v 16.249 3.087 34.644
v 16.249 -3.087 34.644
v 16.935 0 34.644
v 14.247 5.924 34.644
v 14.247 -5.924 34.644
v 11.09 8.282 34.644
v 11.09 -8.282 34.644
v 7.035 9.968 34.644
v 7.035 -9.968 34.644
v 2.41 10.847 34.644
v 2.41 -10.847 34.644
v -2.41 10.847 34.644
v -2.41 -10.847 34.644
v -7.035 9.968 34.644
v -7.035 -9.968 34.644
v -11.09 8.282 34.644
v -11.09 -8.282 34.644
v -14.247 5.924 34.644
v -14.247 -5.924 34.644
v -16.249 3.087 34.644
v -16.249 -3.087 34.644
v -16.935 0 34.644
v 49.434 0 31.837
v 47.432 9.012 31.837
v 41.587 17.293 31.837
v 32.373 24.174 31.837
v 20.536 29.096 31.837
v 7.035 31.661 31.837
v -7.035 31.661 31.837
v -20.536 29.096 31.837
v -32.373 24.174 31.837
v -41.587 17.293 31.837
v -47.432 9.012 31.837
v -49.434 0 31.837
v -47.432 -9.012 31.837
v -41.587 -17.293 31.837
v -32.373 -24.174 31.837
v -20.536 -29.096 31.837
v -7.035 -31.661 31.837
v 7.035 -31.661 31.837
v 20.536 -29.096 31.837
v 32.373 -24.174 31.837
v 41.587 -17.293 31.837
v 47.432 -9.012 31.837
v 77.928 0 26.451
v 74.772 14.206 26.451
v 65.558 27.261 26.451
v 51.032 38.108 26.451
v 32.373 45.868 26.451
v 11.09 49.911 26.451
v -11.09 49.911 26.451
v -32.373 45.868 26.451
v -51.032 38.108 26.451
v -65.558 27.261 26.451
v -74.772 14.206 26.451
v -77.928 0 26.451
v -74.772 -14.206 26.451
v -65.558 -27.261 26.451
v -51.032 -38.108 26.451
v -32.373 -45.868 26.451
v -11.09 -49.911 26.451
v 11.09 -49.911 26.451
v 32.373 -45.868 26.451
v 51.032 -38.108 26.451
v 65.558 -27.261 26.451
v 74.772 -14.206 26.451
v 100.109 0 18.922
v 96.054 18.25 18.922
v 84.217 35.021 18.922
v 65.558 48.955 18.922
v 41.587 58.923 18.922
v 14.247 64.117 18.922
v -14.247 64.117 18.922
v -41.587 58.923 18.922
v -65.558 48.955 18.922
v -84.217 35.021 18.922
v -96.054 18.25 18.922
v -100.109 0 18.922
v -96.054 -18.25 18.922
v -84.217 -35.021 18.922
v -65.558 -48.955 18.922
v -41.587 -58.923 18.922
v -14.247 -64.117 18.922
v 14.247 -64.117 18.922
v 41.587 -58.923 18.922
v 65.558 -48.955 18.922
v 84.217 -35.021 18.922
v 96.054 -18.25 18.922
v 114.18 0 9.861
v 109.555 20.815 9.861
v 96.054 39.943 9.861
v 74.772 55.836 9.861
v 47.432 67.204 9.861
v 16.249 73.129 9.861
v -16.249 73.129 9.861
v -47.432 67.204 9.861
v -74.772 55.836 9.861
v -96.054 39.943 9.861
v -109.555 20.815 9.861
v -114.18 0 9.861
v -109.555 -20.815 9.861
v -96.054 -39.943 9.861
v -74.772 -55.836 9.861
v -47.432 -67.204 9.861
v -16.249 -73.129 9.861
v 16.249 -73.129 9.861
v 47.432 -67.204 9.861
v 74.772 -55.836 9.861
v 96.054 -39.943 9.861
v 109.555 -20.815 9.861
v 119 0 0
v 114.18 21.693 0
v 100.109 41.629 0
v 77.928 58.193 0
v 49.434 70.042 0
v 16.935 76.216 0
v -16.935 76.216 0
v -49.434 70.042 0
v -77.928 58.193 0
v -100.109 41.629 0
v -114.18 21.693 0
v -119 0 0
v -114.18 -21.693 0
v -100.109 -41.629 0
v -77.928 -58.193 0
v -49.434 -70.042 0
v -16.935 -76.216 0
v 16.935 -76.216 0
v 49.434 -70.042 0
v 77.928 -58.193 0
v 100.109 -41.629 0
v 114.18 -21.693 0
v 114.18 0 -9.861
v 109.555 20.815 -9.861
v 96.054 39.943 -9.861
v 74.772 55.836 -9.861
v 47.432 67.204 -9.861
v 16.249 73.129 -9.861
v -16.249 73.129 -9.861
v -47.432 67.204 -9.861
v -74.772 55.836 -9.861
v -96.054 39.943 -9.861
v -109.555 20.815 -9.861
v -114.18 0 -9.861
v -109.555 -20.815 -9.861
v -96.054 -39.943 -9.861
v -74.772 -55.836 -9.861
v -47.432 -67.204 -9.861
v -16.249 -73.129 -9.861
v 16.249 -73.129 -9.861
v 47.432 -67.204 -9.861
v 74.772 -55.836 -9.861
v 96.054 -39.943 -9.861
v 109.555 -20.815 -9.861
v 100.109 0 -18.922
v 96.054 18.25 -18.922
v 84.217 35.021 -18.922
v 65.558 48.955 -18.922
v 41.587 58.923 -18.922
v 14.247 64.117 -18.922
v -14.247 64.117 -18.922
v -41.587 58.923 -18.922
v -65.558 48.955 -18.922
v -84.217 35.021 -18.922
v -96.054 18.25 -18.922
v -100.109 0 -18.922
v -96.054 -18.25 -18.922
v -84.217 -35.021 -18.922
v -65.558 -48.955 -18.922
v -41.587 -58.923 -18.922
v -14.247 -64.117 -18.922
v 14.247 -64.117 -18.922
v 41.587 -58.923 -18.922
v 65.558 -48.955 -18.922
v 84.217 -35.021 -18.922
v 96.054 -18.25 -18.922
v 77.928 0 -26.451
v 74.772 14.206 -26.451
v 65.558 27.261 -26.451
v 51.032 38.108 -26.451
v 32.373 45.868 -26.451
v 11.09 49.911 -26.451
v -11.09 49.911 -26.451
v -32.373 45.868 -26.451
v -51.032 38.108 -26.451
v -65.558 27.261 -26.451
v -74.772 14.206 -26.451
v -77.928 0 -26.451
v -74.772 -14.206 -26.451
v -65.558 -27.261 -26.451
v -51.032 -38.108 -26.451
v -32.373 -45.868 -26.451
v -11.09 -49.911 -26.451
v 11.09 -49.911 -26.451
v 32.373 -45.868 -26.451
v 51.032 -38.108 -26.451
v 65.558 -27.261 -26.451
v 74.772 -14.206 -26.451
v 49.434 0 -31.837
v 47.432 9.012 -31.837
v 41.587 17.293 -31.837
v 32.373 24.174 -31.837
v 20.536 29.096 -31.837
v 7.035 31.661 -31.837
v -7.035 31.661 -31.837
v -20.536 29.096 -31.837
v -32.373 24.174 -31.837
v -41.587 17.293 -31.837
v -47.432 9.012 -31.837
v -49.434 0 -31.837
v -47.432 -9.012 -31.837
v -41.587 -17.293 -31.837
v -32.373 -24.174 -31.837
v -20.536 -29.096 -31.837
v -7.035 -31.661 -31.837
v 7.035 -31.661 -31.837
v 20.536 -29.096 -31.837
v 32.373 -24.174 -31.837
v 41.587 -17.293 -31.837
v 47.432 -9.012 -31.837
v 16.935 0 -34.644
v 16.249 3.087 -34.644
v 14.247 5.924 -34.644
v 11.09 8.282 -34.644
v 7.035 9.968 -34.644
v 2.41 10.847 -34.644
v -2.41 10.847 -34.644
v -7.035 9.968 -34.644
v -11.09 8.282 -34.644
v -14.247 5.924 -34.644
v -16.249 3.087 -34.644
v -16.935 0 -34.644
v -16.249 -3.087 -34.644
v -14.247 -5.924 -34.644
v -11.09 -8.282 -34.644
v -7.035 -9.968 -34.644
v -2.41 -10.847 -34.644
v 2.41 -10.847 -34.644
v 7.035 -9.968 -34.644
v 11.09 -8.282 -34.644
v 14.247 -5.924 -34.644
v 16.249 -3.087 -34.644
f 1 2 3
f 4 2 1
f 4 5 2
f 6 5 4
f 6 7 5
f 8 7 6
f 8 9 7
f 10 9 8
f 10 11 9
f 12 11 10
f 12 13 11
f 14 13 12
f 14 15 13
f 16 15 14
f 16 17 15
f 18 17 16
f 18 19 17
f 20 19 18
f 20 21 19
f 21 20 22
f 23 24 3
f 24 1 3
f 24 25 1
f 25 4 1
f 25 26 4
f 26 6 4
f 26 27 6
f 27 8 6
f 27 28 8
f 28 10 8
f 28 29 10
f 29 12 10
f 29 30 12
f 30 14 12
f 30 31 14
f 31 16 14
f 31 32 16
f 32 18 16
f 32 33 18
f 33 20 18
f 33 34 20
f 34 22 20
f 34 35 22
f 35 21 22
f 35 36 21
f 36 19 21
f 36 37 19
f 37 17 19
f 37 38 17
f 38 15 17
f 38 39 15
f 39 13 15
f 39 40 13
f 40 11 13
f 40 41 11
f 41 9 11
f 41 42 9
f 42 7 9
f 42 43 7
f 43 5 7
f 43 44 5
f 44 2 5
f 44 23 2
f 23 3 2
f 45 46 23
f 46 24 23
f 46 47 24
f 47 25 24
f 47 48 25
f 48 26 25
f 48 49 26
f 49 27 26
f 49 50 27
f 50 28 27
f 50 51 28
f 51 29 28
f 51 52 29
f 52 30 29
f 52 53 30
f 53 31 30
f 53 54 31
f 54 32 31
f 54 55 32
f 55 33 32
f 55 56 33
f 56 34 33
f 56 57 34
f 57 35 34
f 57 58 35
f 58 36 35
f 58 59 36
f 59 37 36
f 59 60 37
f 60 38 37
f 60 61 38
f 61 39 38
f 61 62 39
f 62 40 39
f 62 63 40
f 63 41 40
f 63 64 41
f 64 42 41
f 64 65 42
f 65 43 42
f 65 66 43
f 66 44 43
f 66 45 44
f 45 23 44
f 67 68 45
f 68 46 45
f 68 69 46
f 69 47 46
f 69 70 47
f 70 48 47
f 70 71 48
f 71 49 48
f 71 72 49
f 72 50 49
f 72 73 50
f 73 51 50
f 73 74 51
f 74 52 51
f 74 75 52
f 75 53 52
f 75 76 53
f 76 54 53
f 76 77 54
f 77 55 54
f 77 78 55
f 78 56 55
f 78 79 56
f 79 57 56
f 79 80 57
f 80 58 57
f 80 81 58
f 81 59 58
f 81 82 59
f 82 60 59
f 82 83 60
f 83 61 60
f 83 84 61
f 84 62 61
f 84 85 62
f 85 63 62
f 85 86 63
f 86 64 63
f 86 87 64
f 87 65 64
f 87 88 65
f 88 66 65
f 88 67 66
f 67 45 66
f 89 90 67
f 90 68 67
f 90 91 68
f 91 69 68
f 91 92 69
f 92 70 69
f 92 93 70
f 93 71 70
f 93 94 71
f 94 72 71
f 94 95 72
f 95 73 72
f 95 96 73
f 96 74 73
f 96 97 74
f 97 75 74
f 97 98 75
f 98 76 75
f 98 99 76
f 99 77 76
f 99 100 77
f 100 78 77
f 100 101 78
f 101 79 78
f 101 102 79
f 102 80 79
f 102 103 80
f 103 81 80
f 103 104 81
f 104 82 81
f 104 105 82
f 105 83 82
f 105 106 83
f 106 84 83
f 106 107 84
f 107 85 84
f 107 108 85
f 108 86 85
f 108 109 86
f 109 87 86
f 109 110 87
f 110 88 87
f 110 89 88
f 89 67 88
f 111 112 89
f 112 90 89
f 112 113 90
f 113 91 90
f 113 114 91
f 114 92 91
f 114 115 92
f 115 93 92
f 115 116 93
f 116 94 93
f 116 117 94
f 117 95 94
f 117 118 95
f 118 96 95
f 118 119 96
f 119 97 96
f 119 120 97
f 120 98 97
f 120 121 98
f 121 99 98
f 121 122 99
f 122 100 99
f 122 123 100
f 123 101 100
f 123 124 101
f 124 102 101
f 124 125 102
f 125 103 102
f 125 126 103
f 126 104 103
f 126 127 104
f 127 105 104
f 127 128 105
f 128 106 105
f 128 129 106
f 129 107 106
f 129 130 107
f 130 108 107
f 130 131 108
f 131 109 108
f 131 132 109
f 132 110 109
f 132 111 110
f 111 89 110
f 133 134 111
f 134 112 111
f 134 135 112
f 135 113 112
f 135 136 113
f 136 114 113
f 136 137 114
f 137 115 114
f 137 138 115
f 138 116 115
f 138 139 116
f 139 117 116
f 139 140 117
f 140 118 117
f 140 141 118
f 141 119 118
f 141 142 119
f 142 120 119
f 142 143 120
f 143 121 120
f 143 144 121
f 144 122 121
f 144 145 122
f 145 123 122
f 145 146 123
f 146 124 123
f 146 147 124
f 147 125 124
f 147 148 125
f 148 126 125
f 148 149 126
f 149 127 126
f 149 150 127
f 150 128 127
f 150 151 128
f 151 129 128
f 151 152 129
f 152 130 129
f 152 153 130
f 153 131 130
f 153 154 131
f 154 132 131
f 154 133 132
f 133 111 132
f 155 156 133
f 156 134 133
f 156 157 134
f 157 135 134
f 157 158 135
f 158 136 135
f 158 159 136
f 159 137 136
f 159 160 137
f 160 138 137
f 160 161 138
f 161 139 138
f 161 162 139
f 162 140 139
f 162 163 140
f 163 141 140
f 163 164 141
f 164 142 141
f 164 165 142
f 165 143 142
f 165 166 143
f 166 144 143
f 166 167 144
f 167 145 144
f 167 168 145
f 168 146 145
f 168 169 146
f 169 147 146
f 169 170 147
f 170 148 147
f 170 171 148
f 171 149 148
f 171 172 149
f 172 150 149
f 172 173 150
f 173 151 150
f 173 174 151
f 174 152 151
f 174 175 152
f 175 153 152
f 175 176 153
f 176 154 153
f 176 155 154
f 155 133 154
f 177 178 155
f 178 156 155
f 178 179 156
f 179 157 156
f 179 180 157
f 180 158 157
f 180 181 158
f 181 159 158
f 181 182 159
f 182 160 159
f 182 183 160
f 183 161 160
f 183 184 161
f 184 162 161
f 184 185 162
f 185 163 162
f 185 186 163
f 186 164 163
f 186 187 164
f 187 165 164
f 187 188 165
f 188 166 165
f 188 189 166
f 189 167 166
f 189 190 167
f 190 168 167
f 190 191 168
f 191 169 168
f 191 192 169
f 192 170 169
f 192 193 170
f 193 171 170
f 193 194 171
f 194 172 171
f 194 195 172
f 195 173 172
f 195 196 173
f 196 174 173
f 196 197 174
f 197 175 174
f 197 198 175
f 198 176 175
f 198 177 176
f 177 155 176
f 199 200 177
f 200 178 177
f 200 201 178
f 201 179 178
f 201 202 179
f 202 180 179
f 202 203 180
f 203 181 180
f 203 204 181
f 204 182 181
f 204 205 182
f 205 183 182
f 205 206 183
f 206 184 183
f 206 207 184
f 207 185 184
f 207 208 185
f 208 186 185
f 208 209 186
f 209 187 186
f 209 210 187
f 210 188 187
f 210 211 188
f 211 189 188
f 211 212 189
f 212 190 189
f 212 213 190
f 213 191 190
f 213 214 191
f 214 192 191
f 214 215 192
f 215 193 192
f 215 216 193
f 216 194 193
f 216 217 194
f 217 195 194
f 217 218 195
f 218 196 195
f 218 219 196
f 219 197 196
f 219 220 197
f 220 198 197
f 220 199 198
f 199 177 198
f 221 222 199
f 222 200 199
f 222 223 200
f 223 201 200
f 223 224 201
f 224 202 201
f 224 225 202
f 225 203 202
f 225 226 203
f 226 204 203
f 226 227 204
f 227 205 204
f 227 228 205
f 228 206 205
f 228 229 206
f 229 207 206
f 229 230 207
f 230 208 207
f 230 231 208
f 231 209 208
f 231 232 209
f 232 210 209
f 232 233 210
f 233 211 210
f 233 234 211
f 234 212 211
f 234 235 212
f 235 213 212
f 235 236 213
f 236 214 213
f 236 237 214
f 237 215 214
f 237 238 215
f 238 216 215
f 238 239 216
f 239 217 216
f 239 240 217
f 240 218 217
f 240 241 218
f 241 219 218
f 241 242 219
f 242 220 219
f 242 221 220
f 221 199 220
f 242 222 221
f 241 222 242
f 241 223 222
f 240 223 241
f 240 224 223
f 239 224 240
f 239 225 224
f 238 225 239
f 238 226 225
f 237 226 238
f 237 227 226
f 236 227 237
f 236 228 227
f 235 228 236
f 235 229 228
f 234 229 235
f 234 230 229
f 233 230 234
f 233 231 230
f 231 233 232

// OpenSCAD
// Generated by SolidPython 1.0.1 on 2020-07-29 00:46:53


scale(v = [17, 11, 5]) {
	sphere(r = 7);
}
/***********************************************
*********      SolidPython code:      **********
************************************************
 
# import packages: SolidPython
from solid import *
from solid.utils import *
from itertools import chain, combinations, permutations


class Resize:

    def __init__(self, scad_file):
        self.scad_file = scad_file
        #self.scad_file = import_scad(scad_file)
        # cone/cylinder param:
        self.r1 = 0
        self.r2 = 0
        self.h = 0
        # rectangular prism param:
        self.w = 0
        self.l = 0
        # ellipse param:
        self.r = 0

    # import OpenScad code (file name corresponds to shape)


    # classify shape + parameters
    def assign(self, param1, param2, param3):
        if self.scad_file == 'cone.scad':
            self.r1 = param1
            self.r2 = param2
            self.h = param3
        elif self.scad_file == 'cylinder.scad':
            self.r1 = param1
            self.r2 = param2
            self.h = param3
        elif self.scad_file == 'rectangularPrism.scad':
            self.h = param1
            self.l = param2
            self.w = param3
        else:
            self.r = param1
            self.h = param2

    # resize parameters
    def iterate(self):
        x = range(3, 20, 2)
        i = 1
        if self.scad_file == 'cone.scad':
            tempList = list(permutations(x, 2))
            for temp in tempList:
                param1 = temp[0]
                param2 = temp[1]
                filepath = 'produced_scad_files/' + 'cone' + str(param1) + '_' + str(param2) + '_' + '.scad'
                scad_render_to_file(cylinder(h=param1, r1=param2, r2=0), filepath)

        elif self.scad_file == 'cylinder.scad':
            tempList = list(permutations(x, 3))
            for temp in tempList:
                param1 = temp[0]
                param2 = temp[1]
                filepath = 'produced_scad_files/' + 'cylinder' + str(param1) + '_' + str(param2) + '_' + '.scad'
                scad_render_to_file(cylinder(h=param1, r1=param2, r2=param2), filepath)

        elif self.scad_file == 'rectangularPrism.scad':
            tempList = list(permutations(x, 3))
            for temp in tempList:
                param1 = temp[0]
                param2 = temp[1]
                param3 = temp[2]
                filepath = 'produced_scad_files/' + 'rectangularPrism' + str(param1) + '_' + str(param2) + '_' + str(
                    param3) + '.scad'
                scad_render_to_file(cube(size=(param1, param2, param3)), filepath)

        elif self.scad_file == 'ellipse.scad':
            tempList = list(permutations(x, 4))
            for temp in tempList:
                param1 = temp[0]
                param2 = temp[1]
                param3 = temp[2]
                param4 = temp[3]
                filepath = 'produced_scad_files/' + 'ellipse' + str(param1) + '_' + str(param2) + '_' + str(param3) + '_' + str(param4) + '.scad'
                scad_render_to_file(scale([param1, param2, param3])(sphere(r=param4)), filepath)

    def render_to_scadfile(self):
        scad_render_to_file(scad, 'example.scad') 
 
************************************************/
